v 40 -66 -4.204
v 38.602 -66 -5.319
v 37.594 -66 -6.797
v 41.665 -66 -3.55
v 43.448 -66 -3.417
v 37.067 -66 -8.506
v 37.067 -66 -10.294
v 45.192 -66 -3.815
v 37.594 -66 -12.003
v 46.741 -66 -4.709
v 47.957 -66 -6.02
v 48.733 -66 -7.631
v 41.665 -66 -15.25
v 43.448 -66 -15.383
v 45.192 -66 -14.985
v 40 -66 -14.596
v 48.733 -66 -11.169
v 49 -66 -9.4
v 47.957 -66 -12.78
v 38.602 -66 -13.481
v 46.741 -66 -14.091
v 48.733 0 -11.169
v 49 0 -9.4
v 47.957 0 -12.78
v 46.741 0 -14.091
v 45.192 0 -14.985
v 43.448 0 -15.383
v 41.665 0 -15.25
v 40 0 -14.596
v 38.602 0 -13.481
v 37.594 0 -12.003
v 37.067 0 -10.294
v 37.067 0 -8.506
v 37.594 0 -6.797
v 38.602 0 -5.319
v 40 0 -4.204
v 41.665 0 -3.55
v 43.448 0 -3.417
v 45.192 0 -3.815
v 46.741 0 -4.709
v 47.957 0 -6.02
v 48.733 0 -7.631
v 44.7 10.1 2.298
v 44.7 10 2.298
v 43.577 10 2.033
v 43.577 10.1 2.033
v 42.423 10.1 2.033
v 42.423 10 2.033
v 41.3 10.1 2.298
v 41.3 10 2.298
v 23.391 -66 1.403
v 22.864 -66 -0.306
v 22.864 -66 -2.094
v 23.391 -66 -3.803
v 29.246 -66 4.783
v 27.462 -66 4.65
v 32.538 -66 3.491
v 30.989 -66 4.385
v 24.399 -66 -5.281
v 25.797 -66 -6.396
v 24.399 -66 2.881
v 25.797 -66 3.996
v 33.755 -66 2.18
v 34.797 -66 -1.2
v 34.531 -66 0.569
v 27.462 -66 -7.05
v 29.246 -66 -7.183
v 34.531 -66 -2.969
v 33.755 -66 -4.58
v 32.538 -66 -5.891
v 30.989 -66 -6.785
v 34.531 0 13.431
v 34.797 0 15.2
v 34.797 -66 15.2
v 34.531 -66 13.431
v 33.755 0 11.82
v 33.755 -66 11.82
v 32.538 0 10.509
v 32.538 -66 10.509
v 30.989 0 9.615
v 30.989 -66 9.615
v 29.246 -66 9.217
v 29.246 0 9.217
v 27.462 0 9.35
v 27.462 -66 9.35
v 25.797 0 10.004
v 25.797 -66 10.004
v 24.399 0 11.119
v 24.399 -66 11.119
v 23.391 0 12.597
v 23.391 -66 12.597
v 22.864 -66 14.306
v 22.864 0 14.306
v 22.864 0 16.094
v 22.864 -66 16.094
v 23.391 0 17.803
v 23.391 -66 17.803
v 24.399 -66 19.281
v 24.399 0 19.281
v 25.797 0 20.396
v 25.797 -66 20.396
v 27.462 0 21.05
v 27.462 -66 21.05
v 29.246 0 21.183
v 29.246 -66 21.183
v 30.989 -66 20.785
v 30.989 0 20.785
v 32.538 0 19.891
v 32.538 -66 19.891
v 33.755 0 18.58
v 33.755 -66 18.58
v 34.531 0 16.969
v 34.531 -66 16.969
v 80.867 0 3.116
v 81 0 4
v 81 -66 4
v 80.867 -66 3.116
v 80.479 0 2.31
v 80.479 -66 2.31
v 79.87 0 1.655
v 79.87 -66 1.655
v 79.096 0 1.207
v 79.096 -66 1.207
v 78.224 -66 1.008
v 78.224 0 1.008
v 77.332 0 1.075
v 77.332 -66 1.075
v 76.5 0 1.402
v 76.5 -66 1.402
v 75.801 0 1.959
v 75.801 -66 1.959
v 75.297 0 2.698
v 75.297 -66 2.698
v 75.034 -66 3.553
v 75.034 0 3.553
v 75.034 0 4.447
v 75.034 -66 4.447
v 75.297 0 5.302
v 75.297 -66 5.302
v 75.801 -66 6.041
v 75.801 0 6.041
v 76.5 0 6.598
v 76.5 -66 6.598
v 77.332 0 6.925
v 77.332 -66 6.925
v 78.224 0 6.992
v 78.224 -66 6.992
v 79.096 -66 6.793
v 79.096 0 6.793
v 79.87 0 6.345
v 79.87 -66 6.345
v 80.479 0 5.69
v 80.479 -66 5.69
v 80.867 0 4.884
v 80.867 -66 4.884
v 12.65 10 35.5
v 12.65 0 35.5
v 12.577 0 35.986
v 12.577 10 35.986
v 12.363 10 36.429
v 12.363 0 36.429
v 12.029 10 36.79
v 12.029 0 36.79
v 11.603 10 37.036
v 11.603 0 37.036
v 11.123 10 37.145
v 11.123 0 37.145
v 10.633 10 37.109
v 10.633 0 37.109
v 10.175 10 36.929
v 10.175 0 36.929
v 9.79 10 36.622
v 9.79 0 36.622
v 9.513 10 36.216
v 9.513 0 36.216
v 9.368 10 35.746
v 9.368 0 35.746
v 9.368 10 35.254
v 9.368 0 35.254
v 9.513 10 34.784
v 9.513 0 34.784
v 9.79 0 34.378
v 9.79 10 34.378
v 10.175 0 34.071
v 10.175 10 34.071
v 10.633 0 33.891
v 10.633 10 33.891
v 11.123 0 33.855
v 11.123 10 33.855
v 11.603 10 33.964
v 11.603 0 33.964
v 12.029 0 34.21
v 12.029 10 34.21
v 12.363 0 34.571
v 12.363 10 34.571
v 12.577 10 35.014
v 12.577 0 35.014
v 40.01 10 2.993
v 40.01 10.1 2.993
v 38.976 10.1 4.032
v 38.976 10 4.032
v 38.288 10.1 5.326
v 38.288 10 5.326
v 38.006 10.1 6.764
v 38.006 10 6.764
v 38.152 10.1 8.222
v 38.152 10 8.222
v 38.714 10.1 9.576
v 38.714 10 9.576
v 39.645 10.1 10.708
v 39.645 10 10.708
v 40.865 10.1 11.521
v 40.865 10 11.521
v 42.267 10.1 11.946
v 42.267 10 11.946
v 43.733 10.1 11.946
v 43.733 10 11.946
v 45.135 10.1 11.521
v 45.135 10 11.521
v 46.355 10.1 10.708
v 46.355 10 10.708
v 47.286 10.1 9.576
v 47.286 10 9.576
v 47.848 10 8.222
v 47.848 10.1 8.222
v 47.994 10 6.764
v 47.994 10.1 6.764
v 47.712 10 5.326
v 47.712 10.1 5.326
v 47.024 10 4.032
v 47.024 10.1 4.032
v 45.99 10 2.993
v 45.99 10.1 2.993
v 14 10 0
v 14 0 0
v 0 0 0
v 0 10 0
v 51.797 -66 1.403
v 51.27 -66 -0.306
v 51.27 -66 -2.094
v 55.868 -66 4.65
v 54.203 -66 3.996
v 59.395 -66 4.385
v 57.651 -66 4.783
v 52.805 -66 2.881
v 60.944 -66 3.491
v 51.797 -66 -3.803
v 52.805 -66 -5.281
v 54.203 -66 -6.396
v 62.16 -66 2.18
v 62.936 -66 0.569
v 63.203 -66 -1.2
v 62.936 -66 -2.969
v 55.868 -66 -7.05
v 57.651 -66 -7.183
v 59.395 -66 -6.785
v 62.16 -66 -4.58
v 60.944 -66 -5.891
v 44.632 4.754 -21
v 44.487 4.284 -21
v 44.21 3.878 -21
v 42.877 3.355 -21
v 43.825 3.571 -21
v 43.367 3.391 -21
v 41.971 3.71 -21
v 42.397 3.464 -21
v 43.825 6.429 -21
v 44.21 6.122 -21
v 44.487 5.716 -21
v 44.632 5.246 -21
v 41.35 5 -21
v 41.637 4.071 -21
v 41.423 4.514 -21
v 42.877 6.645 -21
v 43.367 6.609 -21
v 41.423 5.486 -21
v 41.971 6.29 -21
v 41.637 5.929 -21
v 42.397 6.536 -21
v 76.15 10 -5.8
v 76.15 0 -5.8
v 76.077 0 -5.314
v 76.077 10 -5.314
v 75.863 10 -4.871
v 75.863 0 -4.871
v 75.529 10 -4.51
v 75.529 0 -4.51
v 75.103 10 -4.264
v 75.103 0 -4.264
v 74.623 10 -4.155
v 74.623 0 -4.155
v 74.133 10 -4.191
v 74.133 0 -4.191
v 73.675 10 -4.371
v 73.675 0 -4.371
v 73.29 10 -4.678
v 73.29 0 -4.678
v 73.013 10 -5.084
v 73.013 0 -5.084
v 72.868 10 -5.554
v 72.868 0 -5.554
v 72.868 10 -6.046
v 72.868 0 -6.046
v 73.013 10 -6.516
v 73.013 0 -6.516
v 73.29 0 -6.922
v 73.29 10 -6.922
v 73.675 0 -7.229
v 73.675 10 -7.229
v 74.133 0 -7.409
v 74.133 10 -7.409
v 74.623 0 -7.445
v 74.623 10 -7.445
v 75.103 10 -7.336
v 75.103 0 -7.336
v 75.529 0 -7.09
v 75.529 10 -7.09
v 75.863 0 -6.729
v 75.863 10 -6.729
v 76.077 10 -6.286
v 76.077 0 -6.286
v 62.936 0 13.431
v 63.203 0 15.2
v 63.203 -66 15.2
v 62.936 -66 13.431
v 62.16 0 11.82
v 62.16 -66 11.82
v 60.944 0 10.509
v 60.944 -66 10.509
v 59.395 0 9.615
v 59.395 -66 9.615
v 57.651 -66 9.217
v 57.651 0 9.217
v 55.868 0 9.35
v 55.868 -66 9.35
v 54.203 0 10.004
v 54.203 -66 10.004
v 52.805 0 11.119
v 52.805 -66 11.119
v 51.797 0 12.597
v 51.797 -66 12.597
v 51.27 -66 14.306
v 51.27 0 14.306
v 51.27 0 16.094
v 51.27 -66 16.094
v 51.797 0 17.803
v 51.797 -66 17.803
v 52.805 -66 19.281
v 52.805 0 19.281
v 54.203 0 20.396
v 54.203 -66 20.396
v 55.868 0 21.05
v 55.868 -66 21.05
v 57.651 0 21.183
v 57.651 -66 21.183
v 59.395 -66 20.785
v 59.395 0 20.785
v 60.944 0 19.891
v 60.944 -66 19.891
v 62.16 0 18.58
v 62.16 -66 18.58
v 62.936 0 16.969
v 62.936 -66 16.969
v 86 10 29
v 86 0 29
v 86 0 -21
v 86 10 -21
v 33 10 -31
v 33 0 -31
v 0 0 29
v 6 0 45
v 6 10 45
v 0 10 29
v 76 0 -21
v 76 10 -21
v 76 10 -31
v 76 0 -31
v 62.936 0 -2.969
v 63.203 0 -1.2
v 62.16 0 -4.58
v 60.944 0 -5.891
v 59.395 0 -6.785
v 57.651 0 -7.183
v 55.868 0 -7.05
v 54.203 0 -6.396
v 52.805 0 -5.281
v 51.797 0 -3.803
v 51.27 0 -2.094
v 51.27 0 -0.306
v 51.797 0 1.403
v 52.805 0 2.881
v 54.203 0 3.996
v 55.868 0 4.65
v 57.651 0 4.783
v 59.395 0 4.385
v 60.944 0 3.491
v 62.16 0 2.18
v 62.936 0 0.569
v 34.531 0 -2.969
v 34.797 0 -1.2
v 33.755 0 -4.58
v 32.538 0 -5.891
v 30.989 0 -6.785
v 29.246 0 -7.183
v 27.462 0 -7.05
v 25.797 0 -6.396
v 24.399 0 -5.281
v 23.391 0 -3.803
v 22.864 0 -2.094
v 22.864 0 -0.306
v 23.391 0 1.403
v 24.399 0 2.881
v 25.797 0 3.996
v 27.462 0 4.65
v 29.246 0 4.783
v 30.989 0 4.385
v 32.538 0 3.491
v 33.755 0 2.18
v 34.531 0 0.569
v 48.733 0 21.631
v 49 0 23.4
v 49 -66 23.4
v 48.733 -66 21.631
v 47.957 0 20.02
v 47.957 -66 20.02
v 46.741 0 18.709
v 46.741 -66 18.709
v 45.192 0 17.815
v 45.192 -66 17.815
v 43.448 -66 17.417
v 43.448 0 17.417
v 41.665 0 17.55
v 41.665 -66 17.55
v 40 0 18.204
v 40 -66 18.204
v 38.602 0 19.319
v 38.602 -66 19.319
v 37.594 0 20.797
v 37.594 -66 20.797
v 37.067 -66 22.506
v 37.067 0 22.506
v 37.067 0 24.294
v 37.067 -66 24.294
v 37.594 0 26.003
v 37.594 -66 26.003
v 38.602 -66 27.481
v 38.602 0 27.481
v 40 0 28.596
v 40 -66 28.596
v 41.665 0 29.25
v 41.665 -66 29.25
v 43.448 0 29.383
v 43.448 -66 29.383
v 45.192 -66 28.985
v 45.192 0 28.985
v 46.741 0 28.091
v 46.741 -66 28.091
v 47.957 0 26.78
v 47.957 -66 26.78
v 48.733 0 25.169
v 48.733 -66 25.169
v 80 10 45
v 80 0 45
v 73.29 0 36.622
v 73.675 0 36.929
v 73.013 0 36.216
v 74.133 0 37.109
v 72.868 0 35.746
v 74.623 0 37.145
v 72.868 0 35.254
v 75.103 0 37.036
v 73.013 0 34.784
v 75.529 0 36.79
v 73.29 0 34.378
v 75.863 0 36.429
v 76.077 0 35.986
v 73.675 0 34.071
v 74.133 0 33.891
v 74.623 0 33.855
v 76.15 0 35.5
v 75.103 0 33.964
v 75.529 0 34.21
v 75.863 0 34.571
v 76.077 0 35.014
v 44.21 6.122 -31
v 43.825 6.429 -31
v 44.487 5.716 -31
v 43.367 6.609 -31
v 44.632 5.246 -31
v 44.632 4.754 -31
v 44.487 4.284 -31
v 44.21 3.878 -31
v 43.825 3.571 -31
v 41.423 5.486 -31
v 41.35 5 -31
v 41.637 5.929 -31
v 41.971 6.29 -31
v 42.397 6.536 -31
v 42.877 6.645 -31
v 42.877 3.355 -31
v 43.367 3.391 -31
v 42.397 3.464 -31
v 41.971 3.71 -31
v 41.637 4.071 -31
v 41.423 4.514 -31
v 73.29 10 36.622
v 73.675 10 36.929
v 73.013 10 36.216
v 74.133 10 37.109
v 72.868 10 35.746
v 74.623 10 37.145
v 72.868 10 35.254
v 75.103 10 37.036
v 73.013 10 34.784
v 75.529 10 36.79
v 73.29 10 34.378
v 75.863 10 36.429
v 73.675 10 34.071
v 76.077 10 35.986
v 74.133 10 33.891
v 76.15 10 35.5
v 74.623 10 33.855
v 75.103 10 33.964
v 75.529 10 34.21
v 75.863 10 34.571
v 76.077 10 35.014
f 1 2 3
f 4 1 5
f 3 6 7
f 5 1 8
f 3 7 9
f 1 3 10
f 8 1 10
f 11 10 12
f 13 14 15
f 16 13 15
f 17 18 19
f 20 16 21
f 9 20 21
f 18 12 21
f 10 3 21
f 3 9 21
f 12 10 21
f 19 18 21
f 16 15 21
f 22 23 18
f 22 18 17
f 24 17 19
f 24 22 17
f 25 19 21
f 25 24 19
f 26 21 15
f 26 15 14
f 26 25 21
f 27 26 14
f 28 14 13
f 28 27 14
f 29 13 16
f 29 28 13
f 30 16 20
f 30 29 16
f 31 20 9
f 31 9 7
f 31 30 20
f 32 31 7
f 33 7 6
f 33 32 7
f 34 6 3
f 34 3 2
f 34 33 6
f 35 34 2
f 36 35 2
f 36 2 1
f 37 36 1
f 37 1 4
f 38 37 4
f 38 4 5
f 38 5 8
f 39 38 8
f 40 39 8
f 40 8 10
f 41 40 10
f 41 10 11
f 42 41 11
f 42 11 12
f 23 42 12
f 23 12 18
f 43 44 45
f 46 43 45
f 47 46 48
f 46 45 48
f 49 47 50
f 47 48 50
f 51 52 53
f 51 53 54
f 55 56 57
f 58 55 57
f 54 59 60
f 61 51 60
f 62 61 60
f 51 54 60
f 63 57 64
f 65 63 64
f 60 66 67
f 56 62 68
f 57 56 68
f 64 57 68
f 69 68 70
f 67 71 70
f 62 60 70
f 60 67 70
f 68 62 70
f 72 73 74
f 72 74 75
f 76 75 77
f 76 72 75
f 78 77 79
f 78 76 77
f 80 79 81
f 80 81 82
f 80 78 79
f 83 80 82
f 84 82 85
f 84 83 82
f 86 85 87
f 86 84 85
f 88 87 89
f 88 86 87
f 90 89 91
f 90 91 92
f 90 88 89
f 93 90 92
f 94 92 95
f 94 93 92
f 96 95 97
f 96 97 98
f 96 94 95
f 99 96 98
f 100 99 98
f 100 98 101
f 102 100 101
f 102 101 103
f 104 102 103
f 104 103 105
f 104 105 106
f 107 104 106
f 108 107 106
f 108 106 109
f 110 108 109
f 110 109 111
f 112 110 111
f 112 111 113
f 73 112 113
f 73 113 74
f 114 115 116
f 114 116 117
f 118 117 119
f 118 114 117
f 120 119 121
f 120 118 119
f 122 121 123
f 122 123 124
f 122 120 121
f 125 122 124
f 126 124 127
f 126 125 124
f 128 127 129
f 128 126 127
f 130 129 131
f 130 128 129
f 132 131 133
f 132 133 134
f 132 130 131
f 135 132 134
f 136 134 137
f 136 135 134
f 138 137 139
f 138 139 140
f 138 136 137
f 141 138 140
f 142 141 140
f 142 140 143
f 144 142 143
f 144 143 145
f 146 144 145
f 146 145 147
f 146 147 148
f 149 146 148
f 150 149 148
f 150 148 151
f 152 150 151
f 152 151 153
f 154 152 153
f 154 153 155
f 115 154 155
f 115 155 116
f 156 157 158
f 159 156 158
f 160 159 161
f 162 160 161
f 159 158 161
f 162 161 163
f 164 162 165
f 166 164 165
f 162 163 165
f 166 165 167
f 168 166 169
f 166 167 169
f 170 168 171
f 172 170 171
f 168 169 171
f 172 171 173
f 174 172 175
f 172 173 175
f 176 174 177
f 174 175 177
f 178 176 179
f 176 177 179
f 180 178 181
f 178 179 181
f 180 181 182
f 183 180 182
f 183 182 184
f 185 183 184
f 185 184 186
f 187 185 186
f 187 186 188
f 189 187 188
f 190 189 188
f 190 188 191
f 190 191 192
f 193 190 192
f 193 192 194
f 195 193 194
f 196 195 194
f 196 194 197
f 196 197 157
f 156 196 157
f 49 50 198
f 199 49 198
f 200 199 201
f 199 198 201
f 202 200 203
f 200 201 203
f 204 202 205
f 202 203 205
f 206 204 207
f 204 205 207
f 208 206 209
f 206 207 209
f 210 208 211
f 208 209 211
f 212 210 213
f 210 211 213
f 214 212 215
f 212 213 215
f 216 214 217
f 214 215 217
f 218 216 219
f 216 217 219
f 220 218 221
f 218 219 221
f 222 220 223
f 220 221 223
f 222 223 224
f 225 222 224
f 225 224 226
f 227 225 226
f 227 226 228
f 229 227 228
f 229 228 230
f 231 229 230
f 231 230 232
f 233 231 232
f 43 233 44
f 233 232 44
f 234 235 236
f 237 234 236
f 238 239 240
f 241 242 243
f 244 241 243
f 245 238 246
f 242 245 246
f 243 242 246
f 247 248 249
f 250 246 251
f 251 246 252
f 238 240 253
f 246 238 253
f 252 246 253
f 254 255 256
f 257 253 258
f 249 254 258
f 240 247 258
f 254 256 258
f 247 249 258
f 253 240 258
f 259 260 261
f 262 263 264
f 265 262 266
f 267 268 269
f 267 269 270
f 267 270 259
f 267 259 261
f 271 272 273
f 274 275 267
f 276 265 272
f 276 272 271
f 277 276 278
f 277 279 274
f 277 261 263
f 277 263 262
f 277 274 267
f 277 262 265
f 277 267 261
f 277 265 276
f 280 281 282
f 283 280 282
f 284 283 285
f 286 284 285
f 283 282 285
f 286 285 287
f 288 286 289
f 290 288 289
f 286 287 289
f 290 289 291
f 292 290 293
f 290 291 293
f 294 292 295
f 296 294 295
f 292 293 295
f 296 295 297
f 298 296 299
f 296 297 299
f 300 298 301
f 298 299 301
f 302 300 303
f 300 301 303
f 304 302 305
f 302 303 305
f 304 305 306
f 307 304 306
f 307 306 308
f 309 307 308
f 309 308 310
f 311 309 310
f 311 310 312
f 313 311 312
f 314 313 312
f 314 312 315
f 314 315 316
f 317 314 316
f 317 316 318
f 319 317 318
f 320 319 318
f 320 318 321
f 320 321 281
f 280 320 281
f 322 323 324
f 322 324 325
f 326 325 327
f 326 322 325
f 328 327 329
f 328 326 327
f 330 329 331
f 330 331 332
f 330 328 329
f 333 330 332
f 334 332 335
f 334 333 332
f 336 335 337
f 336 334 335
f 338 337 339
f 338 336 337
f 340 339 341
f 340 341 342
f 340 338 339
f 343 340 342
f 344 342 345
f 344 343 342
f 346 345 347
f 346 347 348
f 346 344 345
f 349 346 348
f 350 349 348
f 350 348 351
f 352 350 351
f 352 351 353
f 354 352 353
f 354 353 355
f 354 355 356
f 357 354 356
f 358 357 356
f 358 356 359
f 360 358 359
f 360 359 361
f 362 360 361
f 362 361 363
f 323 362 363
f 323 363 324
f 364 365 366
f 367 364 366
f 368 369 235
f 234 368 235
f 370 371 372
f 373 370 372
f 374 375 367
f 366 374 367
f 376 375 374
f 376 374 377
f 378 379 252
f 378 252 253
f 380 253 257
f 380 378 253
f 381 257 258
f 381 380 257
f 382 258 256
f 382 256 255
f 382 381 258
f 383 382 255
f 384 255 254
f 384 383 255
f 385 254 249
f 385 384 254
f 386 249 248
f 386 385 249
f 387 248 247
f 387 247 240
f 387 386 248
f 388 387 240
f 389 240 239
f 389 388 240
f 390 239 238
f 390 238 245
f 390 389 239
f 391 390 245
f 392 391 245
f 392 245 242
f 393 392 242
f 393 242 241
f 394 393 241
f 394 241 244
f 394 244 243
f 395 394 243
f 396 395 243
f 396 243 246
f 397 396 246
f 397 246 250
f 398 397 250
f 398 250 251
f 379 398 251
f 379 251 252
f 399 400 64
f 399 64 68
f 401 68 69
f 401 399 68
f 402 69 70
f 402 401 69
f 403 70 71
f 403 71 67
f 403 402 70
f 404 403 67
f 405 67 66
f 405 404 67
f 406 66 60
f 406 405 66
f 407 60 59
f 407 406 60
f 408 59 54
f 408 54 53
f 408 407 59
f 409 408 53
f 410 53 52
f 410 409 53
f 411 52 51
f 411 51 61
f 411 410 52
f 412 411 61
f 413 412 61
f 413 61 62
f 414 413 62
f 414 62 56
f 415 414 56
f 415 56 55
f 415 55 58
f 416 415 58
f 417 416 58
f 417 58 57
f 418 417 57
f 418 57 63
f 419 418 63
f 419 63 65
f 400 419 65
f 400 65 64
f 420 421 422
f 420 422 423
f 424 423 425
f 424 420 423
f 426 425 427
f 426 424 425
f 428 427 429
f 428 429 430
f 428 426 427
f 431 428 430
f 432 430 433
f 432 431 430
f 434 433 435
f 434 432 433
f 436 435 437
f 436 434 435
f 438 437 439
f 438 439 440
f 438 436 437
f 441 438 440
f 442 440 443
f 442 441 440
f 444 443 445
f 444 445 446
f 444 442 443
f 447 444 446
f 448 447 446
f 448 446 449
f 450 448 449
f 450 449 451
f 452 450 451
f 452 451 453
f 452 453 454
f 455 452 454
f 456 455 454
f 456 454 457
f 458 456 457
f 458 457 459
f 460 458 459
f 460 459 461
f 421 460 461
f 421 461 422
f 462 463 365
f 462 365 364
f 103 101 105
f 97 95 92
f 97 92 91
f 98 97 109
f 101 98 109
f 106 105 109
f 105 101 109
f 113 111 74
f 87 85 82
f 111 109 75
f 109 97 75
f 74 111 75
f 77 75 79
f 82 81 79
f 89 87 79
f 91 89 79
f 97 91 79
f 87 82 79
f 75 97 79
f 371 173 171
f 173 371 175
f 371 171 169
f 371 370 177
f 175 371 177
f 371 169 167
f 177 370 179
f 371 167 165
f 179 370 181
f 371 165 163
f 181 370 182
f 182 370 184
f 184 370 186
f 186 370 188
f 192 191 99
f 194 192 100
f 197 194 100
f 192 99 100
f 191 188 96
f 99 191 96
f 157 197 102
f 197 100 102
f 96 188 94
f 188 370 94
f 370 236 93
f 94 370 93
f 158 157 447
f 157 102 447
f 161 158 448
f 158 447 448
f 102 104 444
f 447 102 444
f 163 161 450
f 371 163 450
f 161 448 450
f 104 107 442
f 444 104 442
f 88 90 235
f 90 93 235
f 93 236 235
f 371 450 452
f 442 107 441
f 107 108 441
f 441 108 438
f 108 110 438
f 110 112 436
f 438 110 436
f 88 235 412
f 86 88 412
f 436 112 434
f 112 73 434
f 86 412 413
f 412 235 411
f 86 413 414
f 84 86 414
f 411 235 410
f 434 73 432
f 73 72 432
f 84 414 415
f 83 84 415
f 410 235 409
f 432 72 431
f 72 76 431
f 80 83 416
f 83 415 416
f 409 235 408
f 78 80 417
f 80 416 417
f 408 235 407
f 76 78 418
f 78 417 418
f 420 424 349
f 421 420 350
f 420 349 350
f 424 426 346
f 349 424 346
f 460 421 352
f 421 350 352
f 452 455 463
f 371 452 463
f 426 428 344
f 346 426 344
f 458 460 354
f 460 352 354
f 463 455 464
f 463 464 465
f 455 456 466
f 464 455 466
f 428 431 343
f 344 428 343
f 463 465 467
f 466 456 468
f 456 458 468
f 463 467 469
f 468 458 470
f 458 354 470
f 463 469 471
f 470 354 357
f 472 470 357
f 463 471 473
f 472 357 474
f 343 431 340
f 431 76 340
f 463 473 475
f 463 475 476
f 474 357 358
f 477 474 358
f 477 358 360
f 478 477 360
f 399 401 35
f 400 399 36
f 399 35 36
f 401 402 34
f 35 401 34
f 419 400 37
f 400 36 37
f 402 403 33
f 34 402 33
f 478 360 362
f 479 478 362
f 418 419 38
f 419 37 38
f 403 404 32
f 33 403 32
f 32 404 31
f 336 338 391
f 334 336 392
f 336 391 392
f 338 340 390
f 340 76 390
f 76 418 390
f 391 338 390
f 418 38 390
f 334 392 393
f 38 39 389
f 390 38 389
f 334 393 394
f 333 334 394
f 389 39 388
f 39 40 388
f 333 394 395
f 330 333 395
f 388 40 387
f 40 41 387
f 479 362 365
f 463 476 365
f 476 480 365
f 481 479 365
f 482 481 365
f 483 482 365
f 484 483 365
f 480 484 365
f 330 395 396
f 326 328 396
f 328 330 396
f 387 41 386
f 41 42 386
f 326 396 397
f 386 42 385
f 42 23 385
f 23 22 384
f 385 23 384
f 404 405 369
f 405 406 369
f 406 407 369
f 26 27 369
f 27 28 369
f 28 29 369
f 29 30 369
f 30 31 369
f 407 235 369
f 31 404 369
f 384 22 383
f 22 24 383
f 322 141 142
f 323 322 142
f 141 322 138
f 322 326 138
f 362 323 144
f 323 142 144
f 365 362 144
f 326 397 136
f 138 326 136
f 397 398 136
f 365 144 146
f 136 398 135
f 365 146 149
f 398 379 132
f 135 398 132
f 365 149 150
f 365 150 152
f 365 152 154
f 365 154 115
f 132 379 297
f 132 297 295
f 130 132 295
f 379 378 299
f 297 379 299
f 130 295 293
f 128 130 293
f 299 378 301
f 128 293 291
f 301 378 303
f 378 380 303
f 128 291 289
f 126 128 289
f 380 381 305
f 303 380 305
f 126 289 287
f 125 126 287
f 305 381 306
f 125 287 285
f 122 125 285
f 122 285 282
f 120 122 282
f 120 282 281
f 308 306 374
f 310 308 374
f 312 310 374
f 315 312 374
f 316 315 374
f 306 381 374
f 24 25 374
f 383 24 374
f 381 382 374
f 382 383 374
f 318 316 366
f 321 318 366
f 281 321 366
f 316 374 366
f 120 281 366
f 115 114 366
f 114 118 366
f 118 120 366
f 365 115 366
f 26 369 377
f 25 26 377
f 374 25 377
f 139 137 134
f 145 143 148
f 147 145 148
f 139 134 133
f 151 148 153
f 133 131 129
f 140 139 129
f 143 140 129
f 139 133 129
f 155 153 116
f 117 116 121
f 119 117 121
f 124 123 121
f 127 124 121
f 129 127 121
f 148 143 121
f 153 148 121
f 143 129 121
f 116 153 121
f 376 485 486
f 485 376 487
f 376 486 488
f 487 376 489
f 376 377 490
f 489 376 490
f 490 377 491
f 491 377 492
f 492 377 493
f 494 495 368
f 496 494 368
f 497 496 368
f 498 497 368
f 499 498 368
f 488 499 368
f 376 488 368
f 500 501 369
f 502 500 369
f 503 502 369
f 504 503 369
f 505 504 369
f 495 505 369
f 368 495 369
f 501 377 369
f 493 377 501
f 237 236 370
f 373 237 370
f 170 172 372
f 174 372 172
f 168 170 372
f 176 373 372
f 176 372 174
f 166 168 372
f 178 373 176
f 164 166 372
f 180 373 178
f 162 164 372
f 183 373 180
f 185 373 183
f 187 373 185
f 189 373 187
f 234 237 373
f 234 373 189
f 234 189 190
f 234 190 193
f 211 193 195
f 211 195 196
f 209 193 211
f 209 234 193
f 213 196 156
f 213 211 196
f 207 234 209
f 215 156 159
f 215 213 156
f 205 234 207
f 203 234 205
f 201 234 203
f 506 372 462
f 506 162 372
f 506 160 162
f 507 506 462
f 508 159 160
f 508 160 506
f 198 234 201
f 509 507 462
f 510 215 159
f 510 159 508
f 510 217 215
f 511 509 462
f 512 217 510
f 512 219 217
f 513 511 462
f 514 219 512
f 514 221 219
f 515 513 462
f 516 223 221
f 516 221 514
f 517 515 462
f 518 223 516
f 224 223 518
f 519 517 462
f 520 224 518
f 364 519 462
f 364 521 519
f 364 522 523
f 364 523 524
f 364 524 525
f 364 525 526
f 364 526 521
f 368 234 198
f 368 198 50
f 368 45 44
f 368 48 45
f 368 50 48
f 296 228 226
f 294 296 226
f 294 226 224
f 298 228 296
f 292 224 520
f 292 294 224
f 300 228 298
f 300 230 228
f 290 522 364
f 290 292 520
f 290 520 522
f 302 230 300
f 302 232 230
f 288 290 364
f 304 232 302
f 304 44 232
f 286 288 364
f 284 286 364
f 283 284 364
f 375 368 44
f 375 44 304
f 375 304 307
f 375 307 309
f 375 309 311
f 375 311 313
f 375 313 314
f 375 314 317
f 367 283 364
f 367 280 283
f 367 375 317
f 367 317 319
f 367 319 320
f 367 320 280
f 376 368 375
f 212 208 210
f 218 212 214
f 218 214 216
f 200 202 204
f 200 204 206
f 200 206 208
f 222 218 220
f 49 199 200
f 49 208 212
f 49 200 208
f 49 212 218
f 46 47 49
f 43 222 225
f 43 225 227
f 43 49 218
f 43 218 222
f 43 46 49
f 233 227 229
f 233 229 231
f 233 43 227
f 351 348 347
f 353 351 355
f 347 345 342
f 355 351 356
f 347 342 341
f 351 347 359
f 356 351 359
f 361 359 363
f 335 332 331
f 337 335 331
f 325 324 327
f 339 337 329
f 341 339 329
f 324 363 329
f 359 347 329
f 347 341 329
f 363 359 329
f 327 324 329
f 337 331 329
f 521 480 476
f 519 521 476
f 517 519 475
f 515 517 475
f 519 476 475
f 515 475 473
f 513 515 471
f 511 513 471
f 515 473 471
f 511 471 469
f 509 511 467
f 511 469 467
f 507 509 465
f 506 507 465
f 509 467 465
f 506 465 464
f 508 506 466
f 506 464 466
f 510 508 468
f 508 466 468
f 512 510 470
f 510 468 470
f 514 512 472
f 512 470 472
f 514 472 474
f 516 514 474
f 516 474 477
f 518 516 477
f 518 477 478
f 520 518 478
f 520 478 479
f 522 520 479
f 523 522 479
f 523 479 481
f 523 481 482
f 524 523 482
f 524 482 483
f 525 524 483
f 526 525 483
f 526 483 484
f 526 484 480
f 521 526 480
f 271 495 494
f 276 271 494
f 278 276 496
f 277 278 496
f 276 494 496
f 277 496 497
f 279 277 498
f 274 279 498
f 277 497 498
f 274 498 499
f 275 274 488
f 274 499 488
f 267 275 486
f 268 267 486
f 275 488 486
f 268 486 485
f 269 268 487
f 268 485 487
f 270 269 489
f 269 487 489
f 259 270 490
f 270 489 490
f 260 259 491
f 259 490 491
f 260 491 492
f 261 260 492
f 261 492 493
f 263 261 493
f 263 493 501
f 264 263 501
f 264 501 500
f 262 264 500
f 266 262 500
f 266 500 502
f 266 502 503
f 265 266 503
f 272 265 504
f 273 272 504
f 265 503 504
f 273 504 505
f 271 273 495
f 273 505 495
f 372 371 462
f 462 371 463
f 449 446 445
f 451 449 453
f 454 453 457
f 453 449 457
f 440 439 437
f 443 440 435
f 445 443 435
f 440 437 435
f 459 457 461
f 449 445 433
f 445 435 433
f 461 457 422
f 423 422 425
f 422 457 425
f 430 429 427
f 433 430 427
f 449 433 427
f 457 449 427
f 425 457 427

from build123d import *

# Parameters (mm, degrees)
BOSS_EXTRUDE1_DEPTH = 10
CHAMFER1_SIZE       = 6
CHAMFER1_SIZE2      = 16
CHAMFER2_SIZE       = 16
CHAMFER2_SIZE2      = 6
SKETCH2_W           = 10
SKETCH2_H           = 10
CUT_EXTRUDE1_DEPTH  = 10
BOSS_EXTRUDE2_DEPTH = 0.1
SKETCH4_R           = 6
BOSS_EXTRUDE3_DEPTH = 76
SKETCH5_R           = 3
BOSS_EXTRUDE4_DEPTH = 76
SKETCH6_R           = 1.65
CUT_EXTRUDE2_DEPTH  = 11.1
SKETCH7_R           = 1.65
CUT_EXTRUDE3_DEPTH  = 10


with BuildPart() as part:
    # Sketch1 → Boss-Extrude1 (new body)
    with BuildSketch(Plane(origin=(0, 0, 0), x_dir=(1, 0, 0), z_dir=(0, 1, 0))):
        Polygon((0, 0), (0, -45), (86, -45), (86, 31), (33, 31), (14, 0), align=None)
    extrude(amount=BOSS_EXTRUDE1_DEPTH)

    # Chamfer1
    chamfer1_edges = [part.edges().sort_by_distance(p)[0] for p in [
        (86, 5, 45),
    ]]
    chamfer1_side = [part.faces().sort_by_distance(p)[0] for p in [
        (43, 5, 45),
    ]]
    chamfer(chamfer1_edges, length=CHAMFER1_SIZE, length2=CHAMFER1_SIZE2, reference=chamfer1_side[0])

    # Chamfer2
    chamfer2_edges = [part.edges().sort_by_distance(p)[0] for p in [
        (0, 5, 45),
    ]]
    chamfer2_side = [part.faces().sort_by_distance(p)[0] for p in [
        (0, 5, 22.5),
    ]]
    chamfer(chamfer2_edges, length=CHAMFER2_SIZE, length2=CHAMFER2_SIZE2, reference=chamfer2_side[0])

    # Sketch2 → Cut-Extrude1 (cut)
    with BuildSketch(Plane(origin=(0, 10, 0), x_dir=(1, 0, 0), z_dir=(0, 1, 0))):
        with Locations((81, 26)):
            Rectangle(SKETCH2_W, SKETCH2_H)
    extrude(amount=-CUT_EXTRUDE1_DEPTH, mode=Mode.SUBTRACT)

    # Sketch3 → Boss-Extrude2 (add)
    with BuildSketch(Plane(origin=(0, 10, 0), x_dir=(1, 0, 0), z_dir=(0, 1, 0))):
        with BuildLine():
            ThreePointArc((41.3, -2.297872822), (43, -12), (44.7, -2.297872822))
            ThreePointArc((44.7, -2.297872822), (43, -2), (41.3, -2.297872822))
        make_face()
    extrude(amount=BOSS_EXTRUDE2_DEPTH)

    # Sketch4 → Boss-Extrude3 (add)
    with BuildSketch(Plane(origin=(0, 10, 0), x_dir=(1, 0, 0), z_dir=(0, 1, 0))):
        with Locations((43, 9.4)):
            Circle(SKETCH4_R)
        with Locations((57.202816622, 1.2)):
            Circle(SKETCH4_R)
        with Locations((57.202816622, -15.2)):
            Circle(SKETCH4_R)
        with Locations((43, -23.4)):
            Circle(SKETCH4_R)
        with Locations((28.797183378, -15.2)):
            Circle(SKETCH4_R)
        with Locations((28.797183378, 1.2)):
            Circle(SKETCH4_R)
    extrude(amount=-BOSS_EXTRUDE3_DEPTH)

    # Sketch5 → Boss-Extrude4 (add)
    with BuildSketch(Plane(origin=(0, 10, 0), x_dir=(1, 0, 0), z_dir=(0, 1, 0))):
        with Locations((78, -4)):
            Circle(SKETCH5_R)
    extrude(amount=-BOSS_EXTRUDE4_DEPTH)

    # Sketch6 → Cut-Extrude2 (cut, through all)
    with BuildSketch(Plane.XZ):
        with Locations((74.5, -5.8)):
            Circle(SKETCH6_R)
        with Locations((74.5, 35.5)):
            Circle(SKETCH6_R)
        with Locations((11, 35.5)):
            Circle(SKETCH6_R)
    extrude(amount=-CUT_EXTRUDE2_DEPTH, mode=Mode.SUBTRACT)

    # Sketch7 → Cut-Extrude3 (cut)
    with BuildSketch(Plane(origin=(0, 0, -31), x_dir=(-1, 0, 0), z_dir=(0, 0, -1))):
        with Locations((-43, 5)):
            Circle(SKETCH7_R)
    extrude(amount=-CUT_EXTRUDE3_DEPTH, mode=Mode.SUBTRACT)


solid = part.part
